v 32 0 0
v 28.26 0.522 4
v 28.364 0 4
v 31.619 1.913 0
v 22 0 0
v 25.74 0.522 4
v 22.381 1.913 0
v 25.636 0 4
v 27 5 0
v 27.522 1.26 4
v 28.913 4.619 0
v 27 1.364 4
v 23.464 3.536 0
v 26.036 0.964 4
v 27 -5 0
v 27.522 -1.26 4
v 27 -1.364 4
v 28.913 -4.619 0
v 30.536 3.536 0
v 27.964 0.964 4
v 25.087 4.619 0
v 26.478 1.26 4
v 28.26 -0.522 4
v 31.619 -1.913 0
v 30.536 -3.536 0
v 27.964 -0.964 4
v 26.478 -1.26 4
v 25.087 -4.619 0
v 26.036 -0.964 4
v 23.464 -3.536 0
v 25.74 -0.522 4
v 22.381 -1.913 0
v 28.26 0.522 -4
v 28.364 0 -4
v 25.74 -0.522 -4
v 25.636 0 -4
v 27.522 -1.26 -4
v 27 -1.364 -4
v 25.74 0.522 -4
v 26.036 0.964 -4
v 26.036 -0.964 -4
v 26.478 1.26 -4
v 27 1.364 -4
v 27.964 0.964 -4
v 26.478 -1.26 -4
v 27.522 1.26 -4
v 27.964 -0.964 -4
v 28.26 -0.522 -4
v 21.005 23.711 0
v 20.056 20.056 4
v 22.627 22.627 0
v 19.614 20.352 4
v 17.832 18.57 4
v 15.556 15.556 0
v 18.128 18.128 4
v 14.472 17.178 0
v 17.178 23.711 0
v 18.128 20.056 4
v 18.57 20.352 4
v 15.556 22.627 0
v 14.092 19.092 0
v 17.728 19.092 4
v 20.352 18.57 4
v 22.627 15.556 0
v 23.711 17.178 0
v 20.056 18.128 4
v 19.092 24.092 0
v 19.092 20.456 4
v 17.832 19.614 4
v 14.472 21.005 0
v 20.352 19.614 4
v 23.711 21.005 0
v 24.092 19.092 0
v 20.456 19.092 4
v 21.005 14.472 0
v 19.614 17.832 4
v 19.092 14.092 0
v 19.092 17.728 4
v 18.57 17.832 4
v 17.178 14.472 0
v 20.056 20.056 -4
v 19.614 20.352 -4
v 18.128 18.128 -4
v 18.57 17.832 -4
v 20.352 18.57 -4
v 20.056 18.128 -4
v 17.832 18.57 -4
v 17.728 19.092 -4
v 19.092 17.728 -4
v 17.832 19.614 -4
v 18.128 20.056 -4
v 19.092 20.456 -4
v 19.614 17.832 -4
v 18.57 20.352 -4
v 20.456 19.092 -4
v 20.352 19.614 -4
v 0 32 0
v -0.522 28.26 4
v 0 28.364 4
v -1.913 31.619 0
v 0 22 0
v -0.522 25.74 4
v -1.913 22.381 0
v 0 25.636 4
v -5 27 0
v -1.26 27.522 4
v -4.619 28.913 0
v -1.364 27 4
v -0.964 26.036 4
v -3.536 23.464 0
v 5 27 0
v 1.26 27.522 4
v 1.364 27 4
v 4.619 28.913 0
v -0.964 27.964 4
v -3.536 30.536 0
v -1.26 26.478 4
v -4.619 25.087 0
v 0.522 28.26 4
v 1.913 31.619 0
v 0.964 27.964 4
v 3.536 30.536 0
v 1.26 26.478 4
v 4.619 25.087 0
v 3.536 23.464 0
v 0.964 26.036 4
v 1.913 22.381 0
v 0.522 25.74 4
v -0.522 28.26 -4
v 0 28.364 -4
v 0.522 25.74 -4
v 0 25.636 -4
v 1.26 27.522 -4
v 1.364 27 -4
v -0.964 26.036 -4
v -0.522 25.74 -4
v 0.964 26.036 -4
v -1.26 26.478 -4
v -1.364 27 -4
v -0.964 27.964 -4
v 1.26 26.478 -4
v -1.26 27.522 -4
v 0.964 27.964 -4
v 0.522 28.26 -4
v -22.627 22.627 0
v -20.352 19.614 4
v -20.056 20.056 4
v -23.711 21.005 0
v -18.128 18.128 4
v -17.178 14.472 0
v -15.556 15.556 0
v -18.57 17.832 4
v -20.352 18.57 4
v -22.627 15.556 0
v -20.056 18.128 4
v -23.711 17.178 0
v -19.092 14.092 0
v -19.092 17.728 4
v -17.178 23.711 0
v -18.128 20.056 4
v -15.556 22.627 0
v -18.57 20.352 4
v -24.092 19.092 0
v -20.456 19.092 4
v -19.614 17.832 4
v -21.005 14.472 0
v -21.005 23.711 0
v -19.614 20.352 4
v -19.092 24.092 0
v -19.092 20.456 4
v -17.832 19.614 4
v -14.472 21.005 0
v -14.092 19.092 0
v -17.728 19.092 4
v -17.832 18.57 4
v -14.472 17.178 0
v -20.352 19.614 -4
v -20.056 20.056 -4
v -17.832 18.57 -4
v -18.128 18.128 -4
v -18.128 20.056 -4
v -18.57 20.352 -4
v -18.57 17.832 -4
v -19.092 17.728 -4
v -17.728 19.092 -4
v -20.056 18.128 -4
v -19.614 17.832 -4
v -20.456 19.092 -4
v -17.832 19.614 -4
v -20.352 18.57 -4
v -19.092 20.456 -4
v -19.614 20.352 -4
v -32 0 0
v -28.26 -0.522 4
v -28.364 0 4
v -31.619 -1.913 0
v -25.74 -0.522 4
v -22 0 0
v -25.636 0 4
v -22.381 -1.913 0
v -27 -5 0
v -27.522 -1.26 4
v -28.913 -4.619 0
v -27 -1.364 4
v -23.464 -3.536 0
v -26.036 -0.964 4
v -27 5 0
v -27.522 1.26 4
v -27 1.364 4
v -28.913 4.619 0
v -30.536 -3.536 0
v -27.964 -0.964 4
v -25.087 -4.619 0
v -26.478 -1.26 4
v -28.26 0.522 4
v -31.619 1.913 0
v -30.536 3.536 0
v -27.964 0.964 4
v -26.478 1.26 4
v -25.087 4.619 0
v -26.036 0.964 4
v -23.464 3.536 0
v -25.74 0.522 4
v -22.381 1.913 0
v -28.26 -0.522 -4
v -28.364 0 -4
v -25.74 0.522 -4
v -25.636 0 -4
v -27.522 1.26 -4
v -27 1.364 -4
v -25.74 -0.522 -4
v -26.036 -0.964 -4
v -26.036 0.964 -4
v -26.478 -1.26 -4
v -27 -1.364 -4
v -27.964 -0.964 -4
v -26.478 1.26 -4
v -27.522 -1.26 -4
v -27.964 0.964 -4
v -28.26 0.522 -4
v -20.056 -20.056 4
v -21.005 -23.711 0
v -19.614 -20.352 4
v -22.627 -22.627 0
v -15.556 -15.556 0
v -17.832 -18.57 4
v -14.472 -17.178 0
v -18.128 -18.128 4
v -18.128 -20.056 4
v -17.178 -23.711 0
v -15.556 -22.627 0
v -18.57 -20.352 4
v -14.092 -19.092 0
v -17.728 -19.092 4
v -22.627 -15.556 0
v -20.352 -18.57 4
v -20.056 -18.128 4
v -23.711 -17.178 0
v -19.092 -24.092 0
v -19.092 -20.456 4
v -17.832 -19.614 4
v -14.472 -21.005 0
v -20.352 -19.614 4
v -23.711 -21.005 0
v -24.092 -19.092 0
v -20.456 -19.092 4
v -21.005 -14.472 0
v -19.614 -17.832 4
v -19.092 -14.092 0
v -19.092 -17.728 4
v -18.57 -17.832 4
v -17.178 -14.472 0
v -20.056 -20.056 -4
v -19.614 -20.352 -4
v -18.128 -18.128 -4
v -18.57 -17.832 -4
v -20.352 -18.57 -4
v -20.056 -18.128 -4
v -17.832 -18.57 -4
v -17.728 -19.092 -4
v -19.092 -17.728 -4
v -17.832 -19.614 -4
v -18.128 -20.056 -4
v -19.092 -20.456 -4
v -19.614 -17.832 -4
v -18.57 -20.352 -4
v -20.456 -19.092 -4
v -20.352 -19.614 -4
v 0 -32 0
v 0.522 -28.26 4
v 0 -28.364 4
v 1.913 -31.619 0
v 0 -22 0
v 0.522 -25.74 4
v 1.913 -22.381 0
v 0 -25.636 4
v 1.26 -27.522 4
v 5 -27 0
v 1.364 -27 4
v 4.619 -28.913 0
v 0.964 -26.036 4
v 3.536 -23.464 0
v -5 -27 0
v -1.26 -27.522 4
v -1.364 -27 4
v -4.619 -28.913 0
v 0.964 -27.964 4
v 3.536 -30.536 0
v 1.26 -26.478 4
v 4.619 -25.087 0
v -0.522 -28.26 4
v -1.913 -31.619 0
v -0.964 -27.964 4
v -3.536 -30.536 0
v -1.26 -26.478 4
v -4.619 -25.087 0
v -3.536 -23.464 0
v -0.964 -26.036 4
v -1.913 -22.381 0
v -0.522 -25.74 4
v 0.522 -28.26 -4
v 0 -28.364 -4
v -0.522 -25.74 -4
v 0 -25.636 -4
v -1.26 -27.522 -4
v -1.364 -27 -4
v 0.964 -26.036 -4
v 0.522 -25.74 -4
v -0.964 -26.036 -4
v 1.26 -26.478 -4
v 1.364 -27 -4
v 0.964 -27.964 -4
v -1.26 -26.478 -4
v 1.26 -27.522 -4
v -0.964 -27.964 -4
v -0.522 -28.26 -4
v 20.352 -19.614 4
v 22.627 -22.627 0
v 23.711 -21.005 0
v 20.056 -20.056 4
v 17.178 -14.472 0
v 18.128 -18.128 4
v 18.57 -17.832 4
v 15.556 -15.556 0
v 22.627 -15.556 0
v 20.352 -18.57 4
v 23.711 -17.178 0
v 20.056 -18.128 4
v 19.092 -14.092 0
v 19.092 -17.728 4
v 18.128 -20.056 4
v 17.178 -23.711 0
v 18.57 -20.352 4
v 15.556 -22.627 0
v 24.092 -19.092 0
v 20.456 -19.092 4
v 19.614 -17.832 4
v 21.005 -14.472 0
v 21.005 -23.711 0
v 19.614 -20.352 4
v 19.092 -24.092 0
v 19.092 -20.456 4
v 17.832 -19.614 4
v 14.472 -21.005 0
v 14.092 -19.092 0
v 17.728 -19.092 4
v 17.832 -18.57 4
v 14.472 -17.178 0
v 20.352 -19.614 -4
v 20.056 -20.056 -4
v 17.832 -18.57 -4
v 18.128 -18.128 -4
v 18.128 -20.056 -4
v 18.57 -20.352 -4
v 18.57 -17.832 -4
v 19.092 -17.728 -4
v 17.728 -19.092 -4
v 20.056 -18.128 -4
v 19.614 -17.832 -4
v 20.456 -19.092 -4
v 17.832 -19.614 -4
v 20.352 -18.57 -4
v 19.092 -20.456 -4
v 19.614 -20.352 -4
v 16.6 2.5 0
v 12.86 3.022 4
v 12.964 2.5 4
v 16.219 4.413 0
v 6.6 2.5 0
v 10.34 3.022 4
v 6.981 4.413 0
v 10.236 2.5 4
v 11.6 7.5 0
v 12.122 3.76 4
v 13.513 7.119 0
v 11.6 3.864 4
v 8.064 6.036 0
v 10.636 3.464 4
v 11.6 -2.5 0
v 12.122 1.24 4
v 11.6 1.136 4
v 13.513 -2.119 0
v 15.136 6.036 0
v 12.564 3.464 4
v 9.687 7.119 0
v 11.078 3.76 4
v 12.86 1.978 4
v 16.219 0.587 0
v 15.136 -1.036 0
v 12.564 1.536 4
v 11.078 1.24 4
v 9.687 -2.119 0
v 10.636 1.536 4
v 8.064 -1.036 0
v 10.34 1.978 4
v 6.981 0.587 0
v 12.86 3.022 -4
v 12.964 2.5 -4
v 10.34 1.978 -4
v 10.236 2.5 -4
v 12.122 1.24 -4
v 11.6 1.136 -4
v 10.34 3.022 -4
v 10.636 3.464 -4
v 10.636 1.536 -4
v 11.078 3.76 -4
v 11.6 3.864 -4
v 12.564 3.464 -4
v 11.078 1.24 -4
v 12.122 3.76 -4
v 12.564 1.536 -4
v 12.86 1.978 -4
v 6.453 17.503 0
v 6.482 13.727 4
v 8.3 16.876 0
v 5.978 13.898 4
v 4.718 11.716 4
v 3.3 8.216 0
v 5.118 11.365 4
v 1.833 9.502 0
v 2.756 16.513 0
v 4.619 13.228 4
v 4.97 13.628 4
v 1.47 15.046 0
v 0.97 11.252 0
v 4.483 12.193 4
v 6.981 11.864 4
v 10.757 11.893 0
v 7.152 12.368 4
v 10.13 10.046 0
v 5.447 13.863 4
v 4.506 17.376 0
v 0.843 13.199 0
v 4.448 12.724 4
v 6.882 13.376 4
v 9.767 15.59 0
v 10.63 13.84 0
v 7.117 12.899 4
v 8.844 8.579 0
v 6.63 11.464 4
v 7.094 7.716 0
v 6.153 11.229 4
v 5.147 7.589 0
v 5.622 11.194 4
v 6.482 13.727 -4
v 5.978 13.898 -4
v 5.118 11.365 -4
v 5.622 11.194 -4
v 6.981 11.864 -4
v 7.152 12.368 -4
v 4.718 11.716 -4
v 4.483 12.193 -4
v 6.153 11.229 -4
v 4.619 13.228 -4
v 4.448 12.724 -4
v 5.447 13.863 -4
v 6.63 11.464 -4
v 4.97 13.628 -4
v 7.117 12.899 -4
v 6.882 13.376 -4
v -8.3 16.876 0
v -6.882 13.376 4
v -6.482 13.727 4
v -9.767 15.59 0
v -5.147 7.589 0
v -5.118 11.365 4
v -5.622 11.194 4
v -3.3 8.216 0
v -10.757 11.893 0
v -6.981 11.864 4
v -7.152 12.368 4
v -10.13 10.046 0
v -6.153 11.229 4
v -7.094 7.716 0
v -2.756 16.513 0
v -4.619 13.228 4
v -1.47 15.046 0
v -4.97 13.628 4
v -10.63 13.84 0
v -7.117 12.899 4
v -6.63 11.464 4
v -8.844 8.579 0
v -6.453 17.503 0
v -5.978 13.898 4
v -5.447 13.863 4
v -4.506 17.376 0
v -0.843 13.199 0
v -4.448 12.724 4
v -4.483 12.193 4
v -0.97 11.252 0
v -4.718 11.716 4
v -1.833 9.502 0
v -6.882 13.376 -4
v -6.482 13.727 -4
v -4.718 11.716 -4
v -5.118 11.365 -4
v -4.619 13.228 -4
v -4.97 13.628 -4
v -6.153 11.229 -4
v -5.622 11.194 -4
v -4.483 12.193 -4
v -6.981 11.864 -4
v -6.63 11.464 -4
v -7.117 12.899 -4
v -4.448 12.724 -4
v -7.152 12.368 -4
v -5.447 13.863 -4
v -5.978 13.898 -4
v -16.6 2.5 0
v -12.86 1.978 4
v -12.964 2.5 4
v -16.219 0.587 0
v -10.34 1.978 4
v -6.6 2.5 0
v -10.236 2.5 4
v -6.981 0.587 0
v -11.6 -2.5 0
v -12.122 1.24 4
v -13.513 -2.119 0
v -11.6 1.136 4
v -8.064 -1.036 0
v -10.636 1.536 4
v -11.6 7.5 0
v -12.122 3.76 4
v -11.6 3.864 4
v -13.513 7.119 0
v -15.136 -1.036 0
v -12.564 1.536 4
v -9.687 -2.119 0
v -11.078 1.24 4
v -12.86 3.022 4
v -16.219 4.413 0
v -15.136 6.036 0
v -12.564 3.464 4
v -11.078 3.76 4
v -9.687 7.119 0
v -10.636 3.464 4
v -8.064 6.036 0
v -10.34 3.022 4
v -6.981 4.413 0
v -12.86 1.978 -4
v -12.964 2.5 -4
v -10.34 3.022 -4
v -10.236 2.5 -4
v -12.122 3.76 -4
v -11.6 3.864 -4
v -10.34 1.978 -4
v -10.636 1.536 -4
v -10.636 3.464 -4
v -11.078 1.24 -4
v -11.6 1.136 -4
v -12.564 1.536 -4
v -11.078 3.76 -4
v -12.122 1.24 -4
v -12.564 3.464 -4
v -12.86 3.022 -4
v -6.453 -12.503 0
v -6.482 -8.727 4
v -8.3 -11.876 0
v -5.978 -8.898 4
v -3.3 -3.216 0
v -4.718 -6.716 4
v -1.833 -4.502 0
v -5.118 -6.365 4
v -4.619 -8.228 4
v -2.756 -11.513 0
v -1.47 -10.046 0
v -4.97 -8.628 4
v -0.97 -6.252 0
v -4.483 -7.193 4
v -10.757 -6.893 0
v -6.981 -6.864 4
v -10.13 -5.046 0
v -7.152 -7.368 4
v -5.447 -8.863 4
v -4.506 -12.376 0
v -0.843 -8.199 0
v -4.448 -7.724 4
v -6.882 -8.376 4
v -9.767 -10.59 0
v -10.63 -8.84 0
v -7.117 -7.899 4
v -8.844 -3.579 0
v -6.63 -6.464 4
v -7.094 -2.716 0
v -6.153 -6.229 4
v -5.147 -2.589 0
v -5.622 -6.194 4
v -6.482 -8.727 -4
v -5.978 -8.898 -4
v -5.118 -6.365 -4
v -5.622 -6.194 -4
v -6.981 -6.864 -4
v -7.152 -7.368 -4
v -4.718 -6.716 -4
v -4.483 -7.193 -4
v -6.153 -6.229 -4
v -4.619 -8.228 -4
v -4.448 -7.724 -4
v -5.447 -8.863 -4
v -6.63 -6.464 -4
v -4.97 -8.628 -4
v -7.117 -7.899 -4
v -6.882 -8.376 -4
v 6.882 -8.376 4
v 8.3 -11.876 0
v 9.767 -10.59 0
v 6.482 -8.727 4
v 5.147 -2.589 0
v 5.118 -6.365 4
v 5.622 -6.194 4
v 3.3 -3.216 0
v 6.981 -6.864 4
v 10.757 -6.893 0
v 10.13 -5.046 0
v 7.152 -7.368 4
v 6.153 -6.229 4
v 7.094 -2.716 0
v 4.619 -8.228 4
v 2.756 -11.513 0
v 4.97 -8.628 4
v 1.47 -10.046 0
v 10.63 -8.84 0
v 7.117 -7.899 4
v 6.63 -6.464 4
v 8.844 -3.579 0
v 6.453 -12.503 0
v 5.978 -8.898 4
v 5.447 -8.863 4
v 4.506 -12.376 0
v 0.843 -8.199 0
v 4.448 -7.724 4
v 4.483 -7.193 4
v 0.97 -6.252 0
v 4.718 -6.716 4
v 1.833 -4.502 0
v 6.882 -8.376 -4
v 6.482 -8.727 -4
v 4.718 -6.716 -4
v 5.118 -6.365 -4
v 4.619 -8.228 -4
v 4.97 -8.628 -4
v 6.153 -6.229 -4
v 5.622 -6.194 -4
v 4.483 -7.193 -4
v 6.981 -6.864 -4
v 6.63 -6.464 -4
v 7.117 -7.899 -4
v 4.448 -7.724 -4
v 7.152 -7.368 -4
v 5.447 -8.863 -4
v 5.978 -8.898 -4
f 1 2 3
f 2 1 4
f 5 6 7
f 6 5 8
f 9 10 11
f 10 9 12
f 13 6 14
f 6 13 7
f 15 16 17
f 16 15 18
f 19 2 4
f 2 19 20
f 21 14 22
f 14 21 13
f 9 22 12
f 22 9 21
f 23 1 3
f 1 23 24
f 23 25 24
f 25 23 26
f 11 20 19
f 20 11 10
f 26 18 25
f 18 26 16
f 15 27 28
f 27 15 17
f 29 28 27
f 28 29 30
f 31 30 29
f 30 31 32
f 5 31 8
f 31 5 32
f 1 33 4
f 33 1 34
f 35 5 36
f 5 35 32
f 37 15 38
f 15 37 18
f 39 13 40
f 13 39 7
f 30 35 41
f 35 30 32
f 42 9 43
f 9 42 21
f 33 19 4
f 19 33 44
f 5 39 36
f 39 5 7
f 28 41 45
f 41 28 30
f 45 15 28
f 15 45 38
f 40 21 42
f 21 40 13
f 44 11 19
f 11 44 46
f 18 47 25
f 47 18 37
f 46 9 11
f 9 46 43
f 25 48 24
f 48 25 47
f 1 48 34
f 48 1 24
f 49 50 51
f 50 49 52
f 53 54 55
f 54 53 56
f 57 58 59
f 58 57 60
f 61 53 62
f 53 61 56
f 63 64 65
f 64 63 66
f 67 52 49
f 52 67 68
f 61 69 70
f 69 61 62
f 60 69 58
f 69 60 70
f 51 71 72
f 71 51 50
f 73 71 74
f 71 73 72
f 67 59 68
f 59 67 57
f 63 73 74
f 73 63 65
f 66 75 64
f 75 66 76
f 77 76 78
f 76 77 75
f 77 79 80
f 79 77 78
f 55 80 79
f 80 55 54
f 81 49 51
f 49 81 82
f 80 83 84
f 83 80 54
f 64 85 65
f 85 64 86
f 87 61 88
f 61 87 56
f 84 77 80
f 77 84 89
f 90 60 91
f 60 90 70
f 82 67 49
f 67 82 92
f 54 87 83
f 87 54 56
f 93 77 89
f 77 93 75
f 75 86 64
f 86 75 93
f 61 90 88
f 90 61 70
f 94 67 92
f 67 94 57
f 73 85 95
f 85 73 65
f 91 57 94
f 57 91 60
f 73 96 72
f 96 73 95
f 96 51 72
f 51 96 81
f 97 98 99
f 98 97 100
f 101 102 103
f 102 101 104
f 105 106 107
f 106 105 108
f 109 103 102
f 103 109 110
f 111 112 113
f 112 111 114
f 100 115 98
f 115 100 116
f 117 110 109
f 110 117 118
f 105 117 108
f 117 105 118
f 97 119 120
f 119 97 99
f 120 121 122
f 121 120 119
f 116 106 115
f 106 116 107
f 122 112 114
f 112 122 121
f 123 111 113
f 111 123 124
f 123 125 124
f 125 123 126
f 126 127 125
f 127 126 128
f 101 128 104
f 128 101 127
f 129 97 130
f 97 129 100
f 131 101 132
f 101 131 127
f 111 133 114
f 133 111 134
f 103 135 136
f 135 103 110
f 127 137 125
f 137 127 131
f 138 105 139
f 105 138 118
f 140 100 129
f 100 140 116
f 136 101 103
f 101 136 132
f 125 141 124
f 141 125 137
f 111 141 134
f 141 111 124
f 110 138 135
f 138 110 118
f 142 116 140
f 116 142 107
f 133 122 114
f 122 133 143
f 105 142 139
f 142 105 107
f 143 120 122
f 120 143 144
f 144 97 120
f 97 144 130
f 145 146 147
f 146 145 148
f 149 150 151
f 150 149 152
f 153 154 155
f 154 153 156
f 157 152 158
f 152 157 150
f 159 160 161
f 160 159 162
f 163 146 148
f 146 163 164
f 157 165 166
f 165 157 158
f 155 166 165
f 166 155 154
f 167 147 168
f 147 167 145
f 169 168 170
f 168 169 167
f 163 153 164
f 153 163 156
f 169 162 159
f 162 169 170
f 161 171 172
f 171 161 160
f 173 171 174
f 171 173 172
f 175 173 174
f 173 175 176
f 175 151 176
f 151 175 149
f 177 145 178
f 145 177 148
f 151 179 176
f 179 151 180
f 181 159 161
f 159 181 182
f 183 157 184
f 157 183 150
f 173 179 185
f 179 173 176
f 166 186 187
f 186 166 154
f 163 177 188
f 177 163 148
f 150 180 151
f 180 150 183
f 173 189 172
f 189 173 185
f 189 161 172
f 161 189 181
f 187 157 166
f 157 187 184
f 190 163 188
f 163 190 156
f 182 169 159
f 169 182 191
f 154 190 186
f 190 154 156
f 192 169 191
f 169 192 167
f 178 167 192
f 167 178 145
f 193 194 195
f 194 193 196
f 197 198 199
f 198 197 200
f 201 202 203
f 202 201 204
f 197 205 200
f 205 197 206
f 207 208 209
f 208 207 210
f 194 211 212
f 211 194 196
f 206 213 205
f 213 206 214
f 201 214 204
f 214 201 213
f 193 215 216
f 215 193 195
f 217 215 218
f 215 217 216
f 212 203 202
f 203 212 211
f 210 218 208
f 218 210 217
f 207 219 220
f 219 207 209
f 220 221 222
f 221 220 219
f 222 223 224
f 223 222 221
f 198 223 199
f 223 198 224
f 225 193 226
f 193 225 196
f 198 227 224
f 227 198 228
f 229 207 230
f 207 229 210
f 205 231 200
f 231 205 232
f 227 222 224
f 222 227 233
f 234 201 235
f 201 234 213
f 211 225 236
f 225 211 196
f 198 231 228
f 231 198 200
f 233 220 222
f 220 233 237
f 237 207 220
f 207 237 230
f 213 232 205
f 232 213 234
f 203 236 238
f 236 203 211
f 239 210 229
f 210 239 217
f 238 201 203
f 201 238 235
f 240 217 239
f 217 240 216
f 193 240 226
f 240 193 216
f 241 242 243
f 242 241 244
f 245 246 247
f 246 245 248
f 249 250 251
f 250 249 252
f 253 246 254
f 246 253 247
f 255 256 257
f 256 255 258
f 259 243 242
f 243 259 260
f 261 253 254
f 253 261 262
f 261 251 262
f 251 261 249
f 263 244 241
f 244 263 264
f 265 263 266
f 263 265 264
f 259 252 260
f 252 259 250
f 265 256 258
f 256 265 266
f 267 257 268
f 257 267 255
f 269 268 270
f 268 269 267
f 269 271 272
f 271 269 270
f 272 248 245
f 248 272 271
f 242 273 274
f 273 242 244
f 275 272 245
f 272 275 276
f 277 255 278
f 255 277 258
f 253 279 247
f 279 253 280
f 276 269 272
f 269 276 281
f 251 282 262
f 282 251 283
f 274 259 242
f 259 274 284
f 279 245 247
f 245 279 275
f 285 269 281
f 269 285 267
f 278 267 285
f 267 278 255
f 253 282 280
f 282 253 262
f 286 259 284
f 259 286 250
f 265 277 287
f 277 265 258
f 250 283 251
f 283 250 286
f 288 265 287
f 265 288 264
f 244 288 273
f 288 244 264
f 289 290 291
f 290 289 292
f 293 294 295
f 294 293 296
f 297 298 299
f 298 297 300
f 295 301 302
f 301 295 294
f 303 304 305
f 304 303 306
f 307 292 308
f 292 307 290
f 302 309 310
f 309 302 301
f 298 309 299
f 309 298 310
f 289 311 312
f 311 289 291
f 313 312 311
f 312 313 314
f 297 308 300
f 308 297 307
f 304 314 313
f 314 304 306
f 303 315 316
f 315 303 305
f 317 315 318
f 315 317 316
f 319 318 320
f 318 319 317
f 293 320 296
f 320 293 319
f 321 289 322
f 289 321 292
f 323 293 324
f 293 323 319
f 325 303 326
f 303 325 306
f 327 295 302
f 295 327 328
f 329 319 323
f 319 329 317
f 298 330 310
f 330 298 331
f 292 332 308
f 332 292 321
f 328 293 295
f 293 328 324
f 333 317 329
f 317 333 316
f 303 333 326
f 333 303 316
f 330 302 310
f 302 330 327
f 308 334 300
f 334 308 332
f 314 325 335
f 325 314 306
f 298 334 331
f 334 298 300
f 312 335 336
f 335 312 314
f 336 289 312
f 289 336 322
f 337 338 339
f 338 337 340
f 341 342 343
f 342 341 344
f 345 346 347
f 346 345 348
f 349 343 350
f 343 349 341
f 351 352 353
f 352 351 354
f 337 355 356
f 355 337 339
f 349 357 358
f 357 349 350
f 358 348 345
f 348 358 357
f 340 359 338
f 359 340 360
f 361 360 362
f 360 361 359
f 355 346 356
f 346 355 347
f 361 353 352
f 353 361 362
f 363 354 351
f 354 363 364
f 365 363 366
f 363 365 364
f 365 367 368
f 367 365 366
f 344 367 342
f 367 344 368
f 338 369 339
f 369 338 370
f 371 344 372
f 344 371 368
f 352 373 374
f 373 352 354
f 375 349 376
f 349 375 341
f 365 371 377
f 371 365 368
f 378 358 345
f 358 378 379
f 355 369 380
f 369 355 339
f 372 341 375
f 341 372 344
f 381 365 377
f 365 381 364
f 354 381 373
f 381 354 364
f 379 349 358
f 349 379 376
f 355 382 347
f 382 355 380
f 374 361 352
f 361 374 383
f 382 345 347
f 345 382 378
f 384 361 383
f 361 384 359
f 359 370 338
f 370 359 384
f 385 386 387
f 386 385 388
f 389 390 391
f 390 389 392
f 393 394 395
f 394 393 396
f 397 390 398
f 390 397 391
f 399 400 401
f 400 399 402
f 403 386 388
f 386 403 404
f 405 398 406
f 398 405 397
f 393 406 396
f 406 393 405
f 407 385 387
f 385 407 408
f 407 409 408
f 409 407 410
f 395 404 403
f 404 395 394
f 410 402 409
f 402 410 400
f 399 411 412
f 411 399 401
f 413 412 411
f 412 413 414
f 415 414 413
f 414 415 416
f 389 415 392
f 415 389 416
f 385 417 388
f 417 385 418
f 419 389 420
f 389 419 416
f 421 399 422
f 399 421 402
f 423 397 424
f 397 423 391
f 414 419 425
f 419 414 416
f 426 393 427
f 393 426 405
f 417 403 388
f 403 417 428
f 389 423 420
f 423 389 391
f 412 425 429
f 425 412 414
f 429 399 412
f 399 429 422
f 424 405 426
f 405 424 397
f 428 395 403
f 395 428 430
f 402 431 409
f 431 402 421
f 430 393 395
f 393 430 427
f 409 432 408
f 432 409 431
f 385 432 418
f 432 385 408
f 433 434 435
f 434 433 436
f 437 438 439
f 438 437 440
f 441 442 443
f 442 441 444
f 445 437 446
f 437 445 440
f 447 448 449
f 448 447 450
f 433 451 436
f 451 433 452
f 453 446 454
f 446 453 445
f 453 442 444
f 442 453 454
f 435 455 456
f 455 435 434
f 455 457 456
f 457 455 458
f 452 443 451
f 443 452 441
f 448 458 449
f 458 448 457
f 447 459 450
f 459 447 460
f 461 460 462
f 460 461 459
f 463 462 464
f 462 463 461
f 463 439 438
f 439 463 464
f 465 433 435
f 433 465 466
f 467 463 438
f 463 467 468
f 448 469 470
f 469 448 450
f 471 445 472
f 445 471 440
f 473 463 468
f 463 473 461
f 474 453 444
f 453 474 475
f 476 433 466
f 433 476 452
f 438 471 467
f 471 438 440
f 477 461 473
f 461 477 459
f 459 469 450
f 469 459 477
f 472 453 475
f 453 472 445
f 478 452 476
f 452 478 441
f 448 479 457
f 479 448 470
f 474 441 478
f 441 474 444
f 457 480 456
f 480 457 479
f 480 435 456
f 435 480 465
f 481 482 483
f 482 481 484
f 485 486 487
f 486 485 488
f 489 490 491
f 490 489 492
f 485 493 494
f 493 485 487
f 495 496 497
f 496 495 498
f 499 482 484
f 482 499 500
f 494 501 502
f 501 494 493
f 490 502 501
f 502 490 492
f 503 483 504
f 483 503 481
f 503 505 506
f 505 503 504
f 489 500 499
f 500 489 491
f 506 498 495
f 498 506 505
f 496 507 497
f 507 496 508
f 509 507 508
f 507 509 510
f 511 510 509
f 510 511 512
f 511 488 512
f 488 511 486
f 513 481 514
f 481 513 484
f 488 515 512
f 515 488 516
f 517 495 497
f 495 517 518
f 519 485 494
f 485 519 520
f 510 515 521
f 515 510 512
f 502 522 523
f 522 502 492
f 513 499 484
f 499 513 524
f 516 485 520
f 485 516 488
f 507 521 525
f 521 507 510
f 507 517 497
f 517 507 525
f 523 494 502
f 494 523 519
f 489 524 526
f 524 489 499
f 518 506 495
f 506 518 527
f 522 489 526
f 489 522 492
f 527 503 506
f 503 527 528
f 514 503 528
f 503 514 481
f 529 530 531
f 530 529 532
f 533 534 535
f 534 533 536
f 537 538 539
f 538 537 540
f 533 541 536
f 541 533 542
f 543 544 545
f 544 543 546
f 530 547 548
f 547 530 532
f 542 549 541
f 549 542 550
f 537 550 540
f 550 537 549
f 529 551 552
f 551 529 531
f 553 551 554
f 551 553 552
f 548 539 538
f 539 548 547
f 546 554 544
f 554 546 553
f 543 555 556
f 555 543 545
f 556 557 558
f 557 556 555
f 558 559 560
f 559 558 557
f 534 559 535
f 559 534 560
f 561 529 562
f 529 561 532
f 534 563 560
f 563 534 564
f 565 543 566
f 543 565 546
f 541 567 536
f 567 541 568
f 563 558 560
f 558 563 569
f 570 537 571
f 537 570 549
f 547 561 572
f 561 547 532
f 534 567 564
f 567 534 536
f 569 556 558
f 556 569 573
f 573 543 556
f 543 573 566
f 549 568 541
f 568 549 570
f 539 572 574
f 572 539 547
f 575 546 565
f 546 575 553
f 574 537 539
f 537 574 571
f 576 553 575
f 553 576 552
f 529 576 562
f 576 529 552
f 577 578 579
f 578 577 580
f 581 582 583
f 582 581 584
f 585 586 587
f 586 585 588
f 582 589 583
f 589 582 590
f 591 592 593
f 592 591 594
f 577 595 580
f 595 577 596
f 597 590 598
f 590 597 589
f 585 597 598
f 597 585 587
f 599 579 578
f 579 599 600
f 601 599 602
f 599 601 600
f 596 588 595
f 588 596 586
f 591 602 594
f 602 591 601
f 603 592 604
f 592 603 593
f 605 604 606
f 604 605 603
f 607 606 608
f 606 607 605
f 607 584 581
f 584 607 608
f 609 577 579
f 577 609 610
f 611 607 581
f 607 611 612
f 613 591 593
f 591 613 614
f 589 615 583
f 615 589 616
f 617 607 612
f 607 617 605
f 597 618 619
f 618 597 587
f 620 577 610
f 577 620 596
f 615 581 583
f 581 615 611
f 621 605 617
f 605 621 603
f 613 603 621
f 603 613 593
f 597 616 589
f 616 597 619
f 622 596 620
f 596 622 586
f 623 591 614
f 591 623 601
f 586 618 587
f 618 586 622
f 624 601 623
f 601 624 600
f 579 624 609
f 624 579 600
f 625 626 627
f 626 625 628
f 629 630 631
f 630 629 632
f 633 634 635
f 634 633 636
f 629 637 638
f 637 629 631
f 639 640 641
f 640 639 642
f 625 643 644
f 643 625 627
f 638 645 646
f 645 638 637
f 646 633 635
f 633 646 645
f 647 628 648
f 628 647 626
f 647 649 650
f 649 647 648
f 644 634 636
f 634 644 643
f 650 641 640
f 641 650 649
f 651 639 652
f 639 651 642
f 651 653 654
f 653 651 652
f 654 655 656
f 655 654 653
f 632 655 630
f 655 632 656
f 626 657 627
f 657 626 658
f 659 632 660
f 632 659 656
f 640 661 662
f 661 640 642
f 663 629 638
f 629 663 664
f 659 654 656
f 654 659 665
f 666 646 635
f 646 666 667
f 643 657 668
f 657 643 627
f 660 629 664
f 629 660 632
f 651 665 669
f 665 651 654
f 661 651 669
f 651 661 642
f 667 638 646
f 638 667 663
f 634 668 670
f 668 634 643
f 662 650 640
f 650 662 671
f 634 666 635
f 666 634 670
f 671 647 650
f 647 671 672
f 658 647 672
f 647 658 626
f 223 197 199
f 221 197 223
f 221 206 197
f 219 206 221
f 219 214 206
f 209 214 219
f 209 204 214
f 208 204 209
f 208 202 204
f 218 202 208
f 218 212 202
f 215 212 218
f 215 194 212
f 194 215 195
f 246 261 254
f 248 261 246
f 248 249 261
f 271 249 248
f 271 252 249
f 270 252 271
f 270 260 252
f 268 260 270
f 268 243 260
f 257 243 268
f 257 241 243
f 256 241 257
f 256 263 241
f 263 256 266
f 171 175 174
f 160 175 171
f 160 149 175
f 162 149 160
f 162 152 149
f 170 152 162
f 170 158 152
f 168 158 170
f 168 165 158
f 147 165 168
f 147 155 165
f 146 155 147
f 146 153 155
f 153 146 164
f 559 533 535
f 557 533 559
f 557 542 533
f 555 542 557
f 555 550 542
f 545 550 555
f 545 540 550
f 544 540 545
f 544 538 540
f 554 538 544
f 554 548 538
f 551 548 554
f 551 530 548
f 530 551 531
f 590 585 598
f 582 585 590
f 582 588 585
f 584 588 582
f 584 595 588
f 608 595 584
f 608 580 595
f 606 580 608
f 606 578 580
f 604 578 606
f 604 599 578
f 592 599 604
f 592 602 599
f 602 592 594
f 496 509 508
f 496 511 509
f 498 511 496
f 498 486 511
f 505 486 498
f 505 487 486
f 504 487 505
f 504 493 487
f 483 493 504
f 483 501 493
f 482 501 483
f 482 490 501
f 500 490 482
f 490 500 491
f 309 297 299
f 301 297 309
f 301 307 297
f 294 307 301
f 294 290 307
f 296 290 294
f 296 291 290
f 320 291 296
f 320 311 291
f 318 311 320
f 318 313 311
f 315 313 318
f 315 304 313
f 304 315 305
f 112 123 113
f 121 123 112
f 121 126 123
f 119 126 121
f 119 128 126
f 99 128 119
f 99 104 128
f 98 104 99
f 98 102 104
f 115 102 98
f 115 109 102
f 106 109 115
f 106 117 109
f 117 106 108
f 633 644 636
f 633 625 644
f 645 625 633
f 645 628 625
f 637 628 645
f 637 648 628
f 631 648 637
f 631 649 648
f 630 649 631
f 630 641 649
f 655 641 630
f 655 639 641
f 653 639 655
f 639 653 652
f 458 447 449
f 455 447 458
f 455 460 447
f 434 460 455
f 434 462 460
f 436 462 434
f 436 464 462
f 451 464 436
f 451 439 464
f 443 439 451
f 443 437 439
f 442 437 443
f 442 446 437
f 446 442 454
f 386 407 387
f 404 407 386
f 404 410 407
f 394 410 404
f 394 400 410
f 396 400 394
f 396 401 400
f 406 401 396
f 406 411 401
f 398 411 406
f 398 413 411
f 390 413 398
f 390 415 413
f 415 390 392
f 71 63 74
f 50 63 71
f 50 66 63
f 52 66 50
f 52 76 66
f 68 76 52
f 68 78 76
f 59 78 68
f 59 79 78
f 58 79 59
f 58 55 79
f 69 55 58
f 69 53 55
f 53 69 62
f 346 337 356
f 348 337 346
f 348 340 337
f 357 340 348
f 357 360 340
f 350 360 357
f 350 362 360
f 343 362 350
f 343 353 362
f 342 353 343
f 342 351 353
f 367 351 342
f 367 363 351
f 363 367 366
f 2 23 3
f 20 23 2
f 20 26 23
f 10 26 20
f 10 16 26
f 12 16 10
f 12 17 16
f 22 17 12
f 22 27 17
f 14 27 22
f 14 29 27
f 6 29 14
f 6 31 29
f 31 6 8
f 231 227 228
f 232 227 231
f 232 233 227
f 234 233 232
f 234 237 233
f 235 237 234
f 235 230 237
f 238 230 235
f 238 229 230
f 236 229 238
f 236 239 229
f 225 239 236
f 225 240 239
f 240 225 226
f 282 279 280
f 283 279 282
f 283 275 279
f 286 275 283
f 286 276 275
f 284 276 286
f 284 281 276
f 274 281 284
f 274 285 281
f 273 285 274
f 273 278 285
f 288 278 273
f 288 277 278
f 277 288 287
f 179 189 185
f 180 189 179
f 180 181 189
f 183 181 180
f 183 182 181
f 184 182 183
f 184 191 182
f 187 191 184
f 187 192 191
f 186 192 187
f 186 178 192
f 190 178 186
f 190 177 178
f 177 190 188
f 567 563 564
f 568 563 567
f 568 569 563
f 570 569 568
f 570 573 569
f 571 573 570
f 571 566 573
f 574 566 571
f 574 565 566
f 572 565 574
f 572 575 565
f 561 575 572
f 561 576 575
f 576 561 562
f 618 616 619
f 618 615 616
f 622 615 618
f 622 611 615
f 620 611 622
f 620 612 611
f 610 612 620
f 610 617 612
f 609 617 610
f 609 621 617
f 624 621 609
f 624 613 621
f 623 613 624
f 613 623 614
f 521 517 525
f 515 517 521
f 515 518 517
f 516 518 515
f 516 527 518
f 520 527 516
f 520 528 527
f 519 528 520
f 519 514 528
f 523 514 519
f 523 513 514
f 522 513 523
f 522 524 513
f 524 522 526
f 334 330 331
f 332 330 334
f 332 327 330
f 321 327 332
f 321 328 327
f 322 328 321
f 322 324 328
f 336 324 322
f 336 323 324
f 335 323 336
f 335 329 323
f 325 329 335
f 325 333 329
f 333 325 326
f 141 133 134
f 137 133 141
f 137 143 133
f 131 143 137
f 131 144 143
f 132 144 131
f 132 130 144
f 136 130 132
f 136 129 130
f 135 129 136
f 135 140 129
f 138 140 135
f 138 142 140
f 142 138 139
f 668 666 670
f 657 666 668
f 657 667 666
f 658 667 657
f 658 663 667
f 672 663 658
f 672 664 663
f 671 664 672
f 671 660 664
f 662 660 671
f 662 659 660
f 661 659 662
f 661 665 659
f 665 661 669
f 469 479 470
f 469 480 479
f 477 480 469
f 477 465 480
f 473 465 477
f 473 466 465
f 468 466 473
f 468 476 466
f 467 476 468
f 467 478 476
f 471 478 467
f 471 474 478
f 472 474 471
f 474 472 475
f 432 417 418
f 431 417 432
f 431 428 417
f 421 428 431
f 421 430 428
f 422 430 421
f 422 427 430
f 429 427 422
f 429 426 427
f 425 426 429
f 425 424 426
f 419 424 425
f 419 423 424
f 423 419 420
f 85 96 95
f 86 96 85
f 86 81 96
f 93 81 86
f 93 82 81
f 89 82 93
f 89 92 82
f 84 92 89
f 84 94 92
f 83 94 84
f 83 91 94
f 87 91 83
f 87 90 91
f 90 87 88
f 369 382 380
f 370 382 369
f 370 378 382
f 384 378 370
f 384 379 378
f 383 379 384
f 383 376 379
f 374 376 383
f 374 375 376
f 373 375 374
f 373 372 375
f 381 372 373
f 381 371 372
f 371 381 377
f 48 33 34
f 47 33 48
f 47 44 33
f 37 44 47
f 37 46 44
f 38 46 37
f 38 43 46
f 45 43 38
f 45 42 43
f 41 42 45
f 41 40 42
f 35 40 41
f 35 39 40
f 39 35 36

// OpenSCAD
$fn=32;
scale (5){
intersection(){
    
    
    cube([16,16,1.6],true);
    
    
    union()


{
or=5.4;
no=floor((or*2*PI)/4);

 for(r=[0:(360/no):360])
    {
rotate(r)translate([or,0,0])perl(1.1,1,$fn=16);
}

ir=2.22;
ni=floor((ir*2*PI)/2);

 translate([0,.5,])for(r=[0:(360/ni):360])
{
rotate(r)translate([ir+.1,0,0])perl(1.1,1,$fn=16);
}
}}

*intersection(){
    
    
    cube([16,16,1.6],true);
    
    
    union(){

ring();
mirror([ 0,0,1])ring();
 ring2(6.8); 
 ring2(1.2); 
 }

 }


}
module perl(h,r,$fn){
    cylinder(h,r,0);
    mirror([0,0,1])cylinder(h,r,0 );
    
    
    }
    
    
    module ring( ror=4) {
         
rno=floor((ror*2*PI)/2);
st=(360/rno*0.1);
translate([0,0,.55])for(r=[0:st:360]){
    hull(){
            rotate(r)translate([ror,0,-.0])sphere(.5);
            rotate(r+st)translate([ror,0,-.0])sphere(.5); 
           rotate(r)translate([ror,0,-.55])sphere(.4);
            rotate(r+st)translate([ror,0,-.55])sphere(.4);

        rotate(r)translate([1+ror+sin(r*7)*.5,0,sin(r*7)*.25])sphere(.1);
        rotate(r+st)translate([1+ror+sin((r+st)*7)*.5,0,sin((r+st)*7)*.25])sphere(.1);   
        
        rotate(r)translate([1+ror+sin(r*7)*.5,0,1])sphere(.1);
        rotate(r+st)translate([1+ror+sin((r+st)*7)*.5,0,1])sphere(.1);
 
    
        rotate(r)translate([-1+ror+-sin(r*7)*.25,0,sin(r*7)*.45])sphere(.1);
        rotate(r+st)translate([-1+ror+-sin((r+st)*7)*.25,0,sin((r+st)*7)*.45])sphere(.1);
          rotate(r)translate([-1+ror+-sin(r*7)*.25,0,1])sphere(.1);
        rotate(r+st)translate([-1+ror+-sin((r+st)*7)*.25,0,1])sphere(.1);
    }
}
    }
    module ring2(r)
    {
              difference(){
        rotate_extrude(convexity=5)
        {
      
          translate([r,-1])  square(1.5,center=true);
             
            }
            
            or=r;
no=floor((or*2*PI)/4);

  for(r=[0:(360/no):360])
    {
rotate(r)translate([or,0,0])cylinder(2,.2,.2,center=true,$fn=16);
}
            }
        }
